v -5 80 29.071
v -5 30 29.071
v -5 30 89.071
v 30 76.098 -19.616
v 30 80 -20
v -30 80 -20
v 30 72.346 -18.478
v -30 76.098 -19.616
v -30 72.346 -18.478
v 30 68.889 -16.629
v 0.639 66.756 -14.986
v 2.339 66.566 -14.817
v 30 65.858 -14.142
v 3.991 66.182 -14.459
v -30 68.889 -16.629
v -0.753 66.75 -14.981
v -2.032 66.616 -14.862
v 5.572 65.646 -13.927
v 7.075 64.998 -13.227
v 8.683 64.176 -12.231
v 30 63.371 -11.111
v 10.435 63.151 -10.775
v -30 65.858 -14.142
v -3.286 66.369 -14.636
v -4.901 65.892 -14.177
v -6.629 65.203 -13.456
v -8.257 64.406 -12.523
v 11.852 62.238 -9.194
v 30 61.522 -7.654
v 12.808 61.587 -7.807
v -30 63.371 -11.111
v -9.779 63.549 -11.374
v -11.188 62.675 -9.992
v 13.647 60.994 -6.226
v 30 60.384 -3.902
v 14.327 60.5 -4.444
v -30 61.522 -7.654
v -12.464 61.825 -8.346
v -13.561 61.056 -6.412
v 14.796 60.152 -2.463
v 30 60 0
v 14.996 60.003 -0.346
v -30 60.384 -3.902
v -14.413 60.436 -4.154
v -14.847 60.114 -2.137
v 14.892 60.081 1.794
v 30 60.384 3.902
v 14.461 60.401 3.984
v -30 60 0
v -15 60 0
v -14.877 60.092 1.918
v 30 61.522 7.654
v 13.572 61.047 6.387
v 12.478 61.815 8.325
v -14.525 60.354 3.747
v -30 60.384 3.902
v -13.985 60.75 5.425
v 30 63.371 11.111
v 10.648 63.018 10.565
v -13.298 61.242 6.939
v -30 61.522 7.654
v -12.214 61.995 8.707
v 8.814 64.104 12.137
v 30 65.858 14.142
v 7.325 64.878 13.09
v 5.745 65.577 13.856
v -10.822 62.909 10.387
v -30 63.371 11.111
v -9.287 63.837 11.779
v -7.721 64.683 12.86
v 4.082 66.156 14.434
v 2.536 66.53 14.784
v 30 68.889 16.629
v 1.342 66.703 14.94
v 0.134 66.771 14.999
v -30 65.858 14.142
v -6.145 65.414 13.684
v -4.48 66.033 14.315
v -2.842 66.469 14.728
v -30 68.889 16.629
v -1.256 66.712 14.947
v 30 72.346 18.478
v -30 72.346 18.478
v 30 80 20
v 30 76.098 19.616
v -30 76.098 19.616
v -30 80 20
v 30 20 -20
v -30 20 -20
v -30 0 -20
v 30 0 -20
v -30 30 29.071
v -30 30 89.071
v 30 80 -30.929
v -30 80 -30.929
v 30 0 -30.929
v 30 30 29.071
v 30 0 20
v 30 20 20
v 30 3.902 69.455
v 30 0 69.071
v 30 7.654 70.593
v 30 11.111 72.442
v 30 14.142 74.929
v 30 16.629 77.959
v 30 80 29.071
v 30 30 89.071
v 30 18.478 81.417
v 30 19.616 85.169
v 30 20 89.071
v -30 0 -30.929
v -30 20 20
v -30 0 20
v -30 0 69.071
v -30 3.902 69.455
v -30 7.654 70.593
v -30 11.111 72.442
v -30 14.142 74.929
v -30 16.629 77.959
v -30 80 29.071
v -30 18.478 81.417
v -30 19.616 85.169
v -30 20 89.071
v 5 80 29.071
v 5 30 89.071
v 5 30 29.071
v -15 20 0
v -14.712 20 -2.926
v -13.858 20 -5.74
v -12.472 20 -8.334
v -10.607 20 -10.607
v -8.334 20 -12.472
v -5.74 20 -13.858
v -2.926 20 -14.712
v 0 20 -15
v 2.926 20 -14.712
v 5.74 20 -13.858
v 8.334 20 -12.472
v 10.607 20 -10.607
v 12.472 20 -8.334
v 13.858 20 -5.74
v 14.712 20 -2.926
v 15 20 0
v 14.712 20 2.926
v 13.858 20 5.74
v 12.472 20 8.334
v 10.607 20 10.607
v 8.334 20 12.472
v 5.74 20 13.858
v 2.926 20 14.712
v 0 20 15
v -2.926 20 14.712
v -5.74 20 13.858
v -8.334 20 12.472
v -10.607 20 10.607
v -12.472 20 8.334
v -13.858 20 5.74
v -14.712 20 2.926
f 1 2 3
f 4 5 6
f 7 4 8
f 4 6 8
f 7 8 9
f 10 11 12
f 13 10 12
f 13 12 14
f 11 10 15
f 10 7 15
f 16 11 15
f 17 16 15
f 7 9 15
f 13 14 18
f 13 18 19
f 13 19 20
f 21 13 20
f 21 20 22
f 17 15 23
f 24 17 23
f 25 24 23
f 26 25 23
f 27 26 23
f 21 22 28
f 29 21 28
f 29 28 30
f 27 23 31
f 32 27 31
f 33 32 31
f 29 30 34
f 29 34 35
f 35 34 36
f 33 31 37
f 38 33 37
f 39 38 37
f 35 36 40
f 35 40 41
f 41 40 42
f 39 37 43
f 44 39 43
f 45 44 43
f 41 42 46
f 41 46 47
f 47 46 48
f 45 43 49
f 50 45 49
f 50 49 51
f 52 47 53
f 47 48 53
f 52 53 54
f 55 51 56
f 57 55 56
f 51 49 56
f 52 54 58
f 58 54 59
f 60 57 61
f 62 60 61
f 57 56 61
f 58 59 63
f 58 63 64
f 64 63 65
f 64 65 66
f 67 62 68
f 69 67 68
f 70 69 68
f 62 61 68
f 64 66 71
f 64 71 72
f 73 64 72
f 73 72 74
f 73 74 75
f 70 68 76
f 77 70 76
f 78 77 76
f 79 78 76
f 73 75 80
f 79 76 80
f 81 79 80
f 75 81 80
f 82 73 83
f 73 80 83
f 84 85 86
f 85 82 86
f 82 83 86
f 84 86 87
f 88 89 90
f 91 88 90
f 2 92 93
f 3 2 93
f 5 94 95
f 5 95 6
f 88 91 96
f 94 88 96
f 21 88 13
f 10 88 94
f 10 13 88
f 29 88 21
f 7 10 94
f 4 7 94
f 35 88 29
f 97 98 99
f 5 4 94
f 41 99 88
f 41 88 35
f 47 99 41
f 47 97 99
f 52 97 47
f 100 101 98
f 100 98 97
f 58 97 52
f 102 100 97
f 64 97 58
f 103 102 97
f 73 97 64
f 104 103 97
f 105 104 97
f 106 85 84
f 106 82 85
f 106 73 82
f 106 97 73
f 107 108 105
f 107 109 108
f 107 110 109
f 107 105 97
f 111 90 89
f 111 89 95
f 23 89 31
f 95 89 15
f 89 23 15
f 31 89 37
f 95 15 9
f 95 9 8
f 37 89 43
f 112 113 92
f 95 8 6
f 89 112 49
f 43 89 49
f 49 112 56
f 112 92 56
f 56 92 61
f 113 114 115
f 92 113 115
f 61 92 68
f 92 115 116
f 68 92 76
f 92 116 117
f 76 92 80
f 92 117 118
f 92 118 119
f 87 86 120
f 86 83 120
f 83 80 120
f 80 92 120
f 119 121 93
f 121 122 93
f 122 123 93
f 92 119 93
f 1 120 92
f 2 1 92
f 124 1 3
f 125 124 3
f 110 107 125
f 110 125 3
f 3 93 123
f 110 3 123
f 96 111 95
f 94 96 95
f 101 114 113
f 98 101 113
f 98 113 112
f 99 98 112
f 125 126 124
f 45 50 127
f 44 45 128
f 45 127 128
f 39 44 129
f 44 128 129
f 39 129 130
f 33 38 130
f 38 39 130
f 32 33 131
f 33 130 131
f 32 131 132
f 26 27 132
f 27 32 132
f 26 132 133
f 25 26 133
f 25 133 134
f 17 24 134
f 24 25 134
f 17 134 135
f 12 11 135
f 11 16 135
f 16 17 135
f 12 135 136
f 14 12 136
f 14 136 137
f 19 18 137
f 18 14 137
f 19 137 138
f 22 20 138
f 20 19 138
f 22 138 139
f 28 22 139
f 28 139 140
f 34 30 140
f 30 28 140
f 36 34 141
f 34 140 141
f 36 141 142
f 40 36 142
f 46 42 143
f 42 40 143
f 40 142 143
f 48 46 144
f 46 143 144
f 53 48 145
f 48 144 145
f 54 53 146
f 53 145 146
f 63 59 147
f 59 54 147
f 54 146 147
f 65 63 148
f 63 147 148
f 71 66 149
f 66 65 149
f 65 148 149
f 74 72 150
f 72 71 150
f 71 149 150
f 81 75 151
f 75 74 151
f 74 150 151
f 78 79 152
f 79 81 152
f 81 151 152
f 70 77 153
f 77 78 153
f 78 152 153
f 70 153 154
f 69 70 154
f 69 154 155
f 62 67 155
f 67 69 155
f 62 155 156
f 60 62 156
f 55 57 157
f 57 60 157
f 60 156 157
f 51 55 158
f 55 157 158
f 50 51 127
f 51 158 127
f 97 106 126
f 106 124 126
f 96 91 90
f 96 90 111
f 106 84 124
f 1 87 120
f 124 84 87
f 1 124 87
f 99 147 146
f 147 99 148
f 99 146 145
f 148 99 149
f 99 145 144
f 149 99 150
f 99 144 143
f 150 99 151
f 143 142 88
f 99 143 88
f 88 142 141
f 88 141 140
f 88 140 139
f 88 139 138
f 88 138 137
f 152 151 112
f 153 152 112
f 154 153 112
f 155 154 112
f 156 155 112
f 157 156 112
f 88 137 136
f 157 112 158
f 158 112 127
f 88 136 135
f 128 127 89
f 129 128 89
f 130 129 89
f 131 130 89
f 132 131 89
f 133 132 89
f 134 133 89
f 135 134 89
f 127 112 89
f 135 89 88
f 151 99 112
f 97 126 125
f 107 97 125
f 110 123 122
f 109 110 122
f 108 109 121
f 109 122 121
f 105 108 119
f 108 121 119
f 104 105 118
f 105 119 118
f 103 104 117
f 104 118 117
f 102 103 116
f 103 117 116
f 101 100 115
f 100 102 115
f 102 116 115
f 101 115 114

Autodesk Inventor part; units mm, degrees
ref_plane "YZ Plane" through (0, 0, 0) normal (1, 0, 0) x (0, 1, 0)
ref_plane "XZ Plane" through (0, 0, 0) normal (0, 1, 0) x (-1, 0, 0)
ref_plane "XY Plane" through (0, 0, 0) normal (0, 0, 1) x (1, 0, 0)
sketch "Эскиз1" plane through (0, 0, 0) normal (1, 0, 0) x (0, 1, 0)
  line L0 (0, -30.9291) -> (80, -30.9291)
  line L1 (80, 29.0709) -> (30, 29.0709)
  line L2 (30, 29.0709) -> (30, 89.0709)
  line L3 (30, 89.0709) -> (20, 89.0709)
  line L4 (80, 29.0709) -> (30, 89.0709)
  arc A0 (0, 69.0709) -> (20, 89.0709) centre (0, 89.0709) ccw
  arc A1 (80, 20) -> (80, -20) centre (80, 0) ccw
  line L5 (0, 20) -> (20, 20)
  line L6 (20, 20) -> (20, -20)
  line L7 (20, -20) -> (0, -20)
  line L8 (0, -20) -> (0, -30.9291)
  line L9 (80, -30.9291) -> (80, -20)
  line L10 (80, 20) -> (80, 29.0709)
  line L11 (0, 69.0709) -> (0, 20)
  point P0 (0, 0)
extrude "Выдавливание1" add sketch "Эскиз1" along normal mid plane 60 contours L8 L7 L6 L5 L11 A0 L3 L2 L1 L10 A1 L9 L0
extrude "Выдавливание2" add sketch "Эскиз1" along normal mid plane 10 contours L1 L2 L4
sketch "Эскиз3" plane through (0, 0, 0) normal (0, 1, 0) x (-1, 0, 0)
  circle A0 centre (0, 0) radius 15
  dimension "d12" = 30
extrude "Выдавливание3" cut sketch "Эскиз3" along normal blind 100
properties part number "Корпус"
